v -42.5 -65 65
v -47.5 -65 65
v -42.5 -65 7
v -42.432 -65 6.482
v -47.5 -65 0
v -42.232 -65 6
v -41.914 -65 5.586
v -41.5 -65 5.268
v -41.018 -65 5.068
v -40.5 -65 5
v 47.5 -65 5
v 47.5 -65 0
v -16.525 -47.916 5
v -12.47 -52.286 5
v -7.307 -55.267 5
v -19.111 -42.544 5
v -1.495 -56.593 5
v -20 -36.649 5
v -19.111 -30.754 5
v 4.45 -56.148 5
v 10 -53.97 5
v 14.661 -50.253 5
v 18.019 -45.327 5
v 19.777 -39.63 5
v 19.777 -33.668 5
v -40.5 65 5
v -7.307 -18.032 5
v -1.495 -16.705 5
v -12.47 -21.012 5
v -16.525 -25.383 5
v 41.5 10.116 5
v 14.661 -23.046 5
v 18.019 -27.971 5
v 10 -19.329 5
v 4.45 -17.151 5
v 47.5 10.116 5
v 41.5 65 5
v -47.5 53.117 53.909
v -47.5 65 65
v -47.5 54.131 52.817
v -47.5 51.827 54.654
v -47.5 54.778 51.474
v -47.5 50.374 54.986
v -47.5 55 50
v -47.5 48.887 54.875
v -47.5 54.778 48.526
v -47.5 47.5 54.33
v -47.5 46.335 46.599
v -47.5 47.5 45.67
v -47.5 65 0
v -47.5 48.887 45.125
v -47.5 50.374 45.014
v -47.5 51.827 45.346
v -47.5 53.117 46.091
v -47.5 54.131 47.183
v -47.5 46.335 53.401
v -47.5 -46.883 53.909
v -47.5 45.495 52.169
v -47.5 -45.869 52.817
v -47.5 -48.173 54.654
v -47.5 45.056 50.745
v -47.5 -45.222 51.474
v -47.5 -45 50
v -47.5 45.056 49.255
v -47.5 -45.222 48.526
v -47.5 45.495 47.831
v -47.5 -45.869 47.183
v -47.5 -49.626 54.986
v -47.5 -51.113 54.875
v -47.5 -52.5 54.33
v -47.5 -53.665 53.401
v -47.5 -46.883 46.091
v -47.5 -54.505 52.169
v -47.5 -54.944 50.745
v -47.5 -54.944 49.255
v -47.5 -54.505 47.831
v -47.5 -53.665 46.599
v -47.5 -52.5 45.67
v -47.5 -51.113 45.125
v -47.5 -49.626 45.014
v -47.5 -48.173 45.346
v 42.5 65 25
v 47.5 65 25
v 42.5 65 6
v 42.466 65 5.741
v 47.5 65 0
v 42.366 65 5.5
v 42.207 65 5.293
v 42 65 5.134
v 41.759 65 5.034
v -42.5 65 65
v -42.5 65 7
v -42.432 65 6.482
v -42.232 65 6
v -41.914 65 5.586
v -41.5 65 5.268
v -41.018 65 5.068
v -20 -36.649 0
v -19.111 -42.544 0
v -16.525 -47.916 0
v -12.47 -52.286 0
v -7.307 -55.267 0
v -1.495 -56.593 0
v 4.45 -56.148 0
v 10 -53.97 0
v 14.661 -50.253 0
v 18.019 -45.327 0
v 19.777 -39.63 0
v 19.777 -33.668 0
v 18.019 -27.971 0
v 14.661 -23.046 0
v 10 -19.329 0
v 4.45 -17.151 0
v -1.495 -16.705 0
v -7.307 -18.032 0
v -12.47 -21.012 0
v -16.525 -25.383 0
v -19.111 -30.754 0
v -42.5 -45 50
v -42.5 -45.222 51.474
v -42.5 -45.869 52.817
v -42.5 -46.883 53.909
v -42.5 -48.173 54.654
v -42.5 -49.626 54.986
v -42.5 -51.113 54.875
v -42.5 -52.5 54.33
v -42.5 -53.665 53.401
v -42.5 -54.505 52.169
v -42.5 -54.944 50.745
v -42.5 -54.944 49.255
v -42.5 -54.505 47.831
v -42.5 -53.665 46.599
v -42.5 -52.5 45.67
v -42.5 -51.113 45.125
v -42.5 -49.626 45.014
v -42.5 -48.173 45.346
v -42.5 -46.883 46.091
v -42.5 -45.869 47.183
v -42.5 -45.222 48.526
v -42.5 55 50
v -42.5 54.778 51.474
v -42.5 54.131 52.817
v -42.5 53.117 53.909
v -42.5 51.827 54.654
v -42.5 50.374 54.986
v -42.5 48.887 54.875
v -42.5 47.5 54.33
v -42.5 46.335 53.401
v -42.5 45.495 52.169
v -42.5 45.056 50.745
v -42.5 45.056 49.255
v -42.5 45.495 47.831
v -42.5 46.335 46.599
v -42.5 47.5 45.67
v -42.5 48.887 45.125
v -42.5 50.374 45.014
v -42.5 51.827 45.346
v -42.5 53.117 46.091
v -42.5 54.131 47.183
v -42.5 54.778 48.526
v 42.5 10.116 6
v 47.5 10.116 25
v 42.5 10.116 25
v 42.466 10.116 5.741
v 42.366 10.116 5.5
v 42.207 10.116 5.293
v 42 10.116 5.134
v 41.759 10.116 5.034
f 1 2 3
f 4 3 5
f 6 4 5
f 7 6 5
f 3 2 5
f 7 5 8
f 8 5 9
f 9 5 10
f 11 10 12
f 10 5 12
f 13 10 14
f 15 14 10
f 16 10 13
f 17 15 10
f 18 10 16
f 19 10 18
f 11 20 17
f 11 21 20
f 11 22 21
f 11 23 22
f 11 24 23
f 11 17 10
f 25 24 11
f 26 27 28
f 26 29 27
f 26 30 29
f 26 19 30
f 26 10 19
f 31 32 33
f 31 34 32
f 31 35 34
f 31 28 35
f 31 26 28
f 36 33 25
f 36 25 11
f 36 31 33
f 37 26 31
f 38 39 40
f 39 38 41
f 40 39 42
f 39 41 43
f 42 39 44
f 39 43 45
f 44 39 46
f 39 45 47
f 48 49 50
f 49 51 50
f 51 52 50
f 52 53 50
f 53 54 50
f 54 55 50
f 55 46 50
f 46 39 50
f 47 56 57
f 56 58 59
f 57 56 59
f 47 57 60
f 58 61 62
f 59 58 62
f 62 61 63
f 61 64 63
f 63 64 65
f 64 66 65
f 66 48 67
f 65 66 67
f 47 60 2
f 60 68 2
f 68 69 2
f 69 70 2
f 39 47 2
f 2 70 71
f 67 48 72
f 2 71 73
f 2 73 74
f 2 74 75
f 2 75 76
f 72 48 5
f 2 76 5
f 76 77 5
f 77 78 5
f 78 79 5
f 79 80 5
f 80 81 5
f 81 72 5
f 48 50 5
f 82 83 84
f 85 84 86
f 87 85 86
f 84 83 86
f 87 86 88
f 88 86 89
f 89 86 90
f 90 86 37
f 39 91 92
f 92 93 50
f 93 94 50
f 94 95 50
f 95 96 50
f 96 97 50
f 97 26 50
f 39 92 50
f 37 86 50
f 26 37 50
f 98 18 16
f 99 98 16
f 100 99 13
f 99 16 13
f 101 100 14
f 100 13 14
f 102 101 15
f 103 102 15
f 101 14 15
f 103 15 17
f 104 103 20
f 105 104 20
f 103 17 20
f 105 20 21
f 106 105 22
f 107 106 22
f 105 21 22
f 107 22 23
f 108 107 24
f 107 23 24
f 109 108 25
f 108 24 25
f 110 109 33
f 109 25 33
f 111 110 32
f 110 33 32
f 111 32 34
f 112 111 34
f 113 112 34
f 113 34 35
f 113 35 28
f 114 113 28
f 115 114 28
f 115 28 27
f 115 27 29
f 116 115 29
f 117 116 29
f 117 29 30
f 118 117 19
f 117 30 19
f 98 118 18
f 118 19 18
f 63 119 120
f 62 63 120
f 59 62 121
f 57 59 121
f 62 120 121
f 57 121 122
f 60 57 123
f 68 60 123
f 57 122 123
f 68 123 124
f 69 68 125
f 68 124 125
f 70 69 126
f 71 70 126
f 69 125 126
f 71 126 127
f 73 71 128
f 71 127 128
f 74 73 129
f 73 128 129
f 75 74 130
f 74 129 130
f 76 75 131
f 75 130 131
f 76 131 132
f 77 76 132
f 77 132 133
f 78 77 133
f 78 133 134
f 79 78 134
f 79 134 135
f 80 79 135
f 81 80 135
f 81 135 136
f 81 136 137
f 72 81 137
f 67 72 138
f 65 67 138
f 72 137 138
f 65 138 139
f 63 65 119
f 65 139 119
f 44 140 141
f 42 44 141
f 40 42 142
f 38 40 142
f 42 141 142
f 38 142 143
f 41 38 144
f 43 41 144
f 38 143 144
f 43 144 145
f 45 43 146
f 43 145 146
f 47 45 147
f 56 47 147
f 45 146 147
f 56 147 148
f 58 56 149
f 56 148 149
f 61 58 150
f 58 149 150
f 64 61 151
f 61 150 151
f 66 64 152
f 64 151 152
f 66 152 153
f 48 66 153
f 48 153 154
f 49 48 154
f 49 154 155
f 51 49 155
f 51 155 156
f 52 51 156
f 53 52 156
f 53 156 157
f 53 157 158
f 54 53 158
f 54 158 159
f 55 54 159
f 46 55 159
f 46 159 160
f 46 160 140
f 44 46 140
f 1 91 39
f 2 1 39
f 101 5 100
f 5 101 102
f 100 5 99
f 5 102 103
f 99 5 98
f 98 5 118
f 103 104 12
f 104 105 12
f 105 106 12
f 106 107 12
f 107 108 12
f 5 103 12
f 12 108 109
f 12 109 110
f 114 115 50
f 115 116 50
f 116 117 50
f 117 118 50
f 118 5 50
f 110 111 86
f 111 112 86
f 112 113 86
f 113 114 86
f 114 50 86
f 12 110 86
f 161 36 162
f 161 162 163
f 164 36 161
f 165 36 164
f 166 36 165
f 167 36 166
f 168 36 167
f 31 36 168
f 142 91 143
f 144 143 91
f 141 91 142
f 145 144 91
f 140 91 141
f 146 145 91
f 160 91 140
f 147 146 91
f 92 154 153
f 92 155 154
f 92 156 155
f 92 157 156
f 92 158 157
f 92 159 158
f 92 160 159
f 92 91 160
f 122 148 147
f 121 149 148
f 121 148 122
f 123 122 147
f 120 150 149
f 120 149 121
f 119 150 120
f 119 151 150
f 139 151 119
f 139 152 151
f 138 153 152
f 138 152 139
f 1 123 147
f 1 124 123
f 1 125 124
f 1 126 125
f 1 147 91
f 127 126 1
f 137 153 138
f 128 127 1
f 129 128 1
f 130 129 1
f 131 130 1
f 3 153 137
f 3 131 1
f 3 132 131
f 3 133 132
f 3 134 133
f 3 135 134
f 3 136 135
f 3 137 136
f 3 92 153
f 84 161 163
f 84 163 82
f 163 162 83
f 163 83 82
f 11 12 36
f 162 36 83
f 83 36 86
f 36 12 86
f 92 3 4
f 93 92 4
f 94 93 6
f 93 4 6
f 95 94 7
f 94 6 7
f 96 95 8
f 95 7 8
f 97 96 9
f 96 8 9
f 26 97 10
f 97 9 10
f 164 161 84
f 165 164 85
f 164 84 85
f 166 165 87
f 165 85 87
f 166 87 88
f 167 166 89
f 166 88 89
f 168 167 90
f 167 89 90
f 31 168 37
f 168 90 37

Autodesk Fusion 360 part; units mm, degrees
sketch "Sketch1" plane through (0, 0, 0) normal (0, 0, 1) x (1, 0, 0)
  line L0 (-45, 60) -> (45, 60)
  line L1 (45, 60) -> (45, -60)
  line L2 (45, -60) -> (-45, -60)
  line L3 (-45, -60) -> (-45, 60)
  line L4 (-45, 60) -> (45, -60) construction
  line L5 (45, 60) -> (-45, -60) construction
  dimension "d1" = 90
  dimension "d2" = 120
sketch "Sketch3" plane through (0, 0, 0) normal (0, 0, 1) x (1, 0, 0)
  line L0 (-47.5, 65) -> (47.5, 65)
  line L1 (47.5, 65) -> (47.5, -65)
  line L2 (47.5, -65) -> (-47.5, -65)
  line L3 (-47.5, -65) -> (-47.5, 65)
  line L4 (-47.5, 65) -> (47.5, -65) construction
  line L5 (47.5, 65) -> (-47.5, -65) construction
  dimension "d8" = 95
  dimension "d9" = 130
extrude "Extrude3" add sketch "Sketch3" along normal blind 5
sketch "Sketch4" plane through (0, 0, 5) normal (0, 0, 1) x (-1, 0, 0)
  line L0 (47.5, 65) -> (-47.5, 65)
  line L1 (-47.5, 65) -> (-47.5, -65)
  line L2 (-47.5, -65) -> (47.5, -65)
  line L3 (47.5, -65) -> (47.5, 65)
  circle A0 centre (0, 36.6491) radius 20
  dimension "d12" = 40
extrude "Extrude4" cut sketch "Sketch4" against normal blind 10 contours A0
sketch "Sketch5" plane through (0, 0, 5) normal (0, 0, 1) x (-1, 0, 0)
  circle A0 centre (0, 36.6491) radius 20
  line L0 (47.5, 65) -> (-47.5, 65)
  line L1 (-47.5, 65) -> (-47.5, -65)
  line L2 (-47.5, -65) -> (47.5, -65)
  line L3 (47.5, -65) -> (47.5, 65)
  line L4 (47.5, -65) -> (42.5, -65)
  line L5 (42.5, -65) -> (42.5, 65)
  line L6 (42.5, 65) -> (47.5, 65)
  line L7 (47.5, 65) -> (47.5, -65)
  dimension "d15" = 5
extrude "Extrude5" add sketch "Sketch5" along normal blind 60 contours L0 L2 L3 L4 L5 L6 L7
fillet "Fillet1" radius 2 1 edges at (-42.5, 0, 5)
sketch "Sketch6" plane through (-42.5, 0, 0) normal (1, 0, 0) x (0, 1, 0)
  line L0 (-65, 7) -> (65, 7)
  line L1 (65, 7) -> (65, 65)
  line L2 (65, 65) -> (-65, 65)
  line L3 (-65, 65) -> (-65, 7)
  circle A0 centre (-50, 50) radius 5
  circle A1 centre (50, 50) radius 5
  dimension "d20" = 10
  dimension "d21" = 10
extrude "Extrude6" cut sketch "Sketch6" against normal blind 10 contours A0
sketch "Sketch7" plane through (-42.5, 0, 0) normal (1, 0, 0) x (0, 1, 0)
  circle A0 centre (-50, 50) radius 5
  line L0 (-65, 7) -> (65, 7)
  line L1 (65, 7) -> (65, 65)
  line L2 (65, 65) -> (-65, 65)
  line L3 (-65, 65) -> (-65, 7)
  circle A1 centre (50, 50) radius 5
  dimension "d24" = 10
extrude "Extrude7" cut sketch "Sketch7" against normal blind 20 contours A1
sketch "Sketch8" plane through (0, 0, 5) normal (0, 0, 1) x (-1, 0, 0)
  line L0 (40.5, -65) -> (40.5, 65)
  line L1 (40.5, 65) -> (-47.5, 65)
  line L2 (-47.5, 65) -> (-47.5, -65)
  line L3 (-47.5, -65) -> (40.5, -65)
  circle A0 centre (0, 36.6491) radius 20
  line L4 (-47.5, -10.1158) -> (-42.5, -10.1158)
  line L5 (-42.5, -10.1158) -> (-42.5, -65)
  line L6 (-42.5, -65) -> (-47.5, -65)
  line L7 (-47.5, -65) -> (-47.5, -10.1158)
  dimension "d27" = 5
extrude "Extrude8" add sketch "Sketch8" along normal blind 20 contours L2 L3 L4 L5 L6 L7
fillet "Fillet2" radius 1 1 edges at (42.5, 37.5579, 5)
extrude "Extrude1" [suppressed]
sketch "Sketch2" plane through (0, 0, 5) normal (0, 0, 1) x (-1, 0, 0)
  line L0 (45, 60) -> (-45, 60)
  line L1 (-45, 60) -> (-45, -60)
  line L2 (-45, -60) -> (45, -60)
  line L3 (45, -60) -> (45, 60)
  circle A0 centre (0, 0) radius 20
  dimension "d5" = 40
extrude "Extrude2" [suppressed]
